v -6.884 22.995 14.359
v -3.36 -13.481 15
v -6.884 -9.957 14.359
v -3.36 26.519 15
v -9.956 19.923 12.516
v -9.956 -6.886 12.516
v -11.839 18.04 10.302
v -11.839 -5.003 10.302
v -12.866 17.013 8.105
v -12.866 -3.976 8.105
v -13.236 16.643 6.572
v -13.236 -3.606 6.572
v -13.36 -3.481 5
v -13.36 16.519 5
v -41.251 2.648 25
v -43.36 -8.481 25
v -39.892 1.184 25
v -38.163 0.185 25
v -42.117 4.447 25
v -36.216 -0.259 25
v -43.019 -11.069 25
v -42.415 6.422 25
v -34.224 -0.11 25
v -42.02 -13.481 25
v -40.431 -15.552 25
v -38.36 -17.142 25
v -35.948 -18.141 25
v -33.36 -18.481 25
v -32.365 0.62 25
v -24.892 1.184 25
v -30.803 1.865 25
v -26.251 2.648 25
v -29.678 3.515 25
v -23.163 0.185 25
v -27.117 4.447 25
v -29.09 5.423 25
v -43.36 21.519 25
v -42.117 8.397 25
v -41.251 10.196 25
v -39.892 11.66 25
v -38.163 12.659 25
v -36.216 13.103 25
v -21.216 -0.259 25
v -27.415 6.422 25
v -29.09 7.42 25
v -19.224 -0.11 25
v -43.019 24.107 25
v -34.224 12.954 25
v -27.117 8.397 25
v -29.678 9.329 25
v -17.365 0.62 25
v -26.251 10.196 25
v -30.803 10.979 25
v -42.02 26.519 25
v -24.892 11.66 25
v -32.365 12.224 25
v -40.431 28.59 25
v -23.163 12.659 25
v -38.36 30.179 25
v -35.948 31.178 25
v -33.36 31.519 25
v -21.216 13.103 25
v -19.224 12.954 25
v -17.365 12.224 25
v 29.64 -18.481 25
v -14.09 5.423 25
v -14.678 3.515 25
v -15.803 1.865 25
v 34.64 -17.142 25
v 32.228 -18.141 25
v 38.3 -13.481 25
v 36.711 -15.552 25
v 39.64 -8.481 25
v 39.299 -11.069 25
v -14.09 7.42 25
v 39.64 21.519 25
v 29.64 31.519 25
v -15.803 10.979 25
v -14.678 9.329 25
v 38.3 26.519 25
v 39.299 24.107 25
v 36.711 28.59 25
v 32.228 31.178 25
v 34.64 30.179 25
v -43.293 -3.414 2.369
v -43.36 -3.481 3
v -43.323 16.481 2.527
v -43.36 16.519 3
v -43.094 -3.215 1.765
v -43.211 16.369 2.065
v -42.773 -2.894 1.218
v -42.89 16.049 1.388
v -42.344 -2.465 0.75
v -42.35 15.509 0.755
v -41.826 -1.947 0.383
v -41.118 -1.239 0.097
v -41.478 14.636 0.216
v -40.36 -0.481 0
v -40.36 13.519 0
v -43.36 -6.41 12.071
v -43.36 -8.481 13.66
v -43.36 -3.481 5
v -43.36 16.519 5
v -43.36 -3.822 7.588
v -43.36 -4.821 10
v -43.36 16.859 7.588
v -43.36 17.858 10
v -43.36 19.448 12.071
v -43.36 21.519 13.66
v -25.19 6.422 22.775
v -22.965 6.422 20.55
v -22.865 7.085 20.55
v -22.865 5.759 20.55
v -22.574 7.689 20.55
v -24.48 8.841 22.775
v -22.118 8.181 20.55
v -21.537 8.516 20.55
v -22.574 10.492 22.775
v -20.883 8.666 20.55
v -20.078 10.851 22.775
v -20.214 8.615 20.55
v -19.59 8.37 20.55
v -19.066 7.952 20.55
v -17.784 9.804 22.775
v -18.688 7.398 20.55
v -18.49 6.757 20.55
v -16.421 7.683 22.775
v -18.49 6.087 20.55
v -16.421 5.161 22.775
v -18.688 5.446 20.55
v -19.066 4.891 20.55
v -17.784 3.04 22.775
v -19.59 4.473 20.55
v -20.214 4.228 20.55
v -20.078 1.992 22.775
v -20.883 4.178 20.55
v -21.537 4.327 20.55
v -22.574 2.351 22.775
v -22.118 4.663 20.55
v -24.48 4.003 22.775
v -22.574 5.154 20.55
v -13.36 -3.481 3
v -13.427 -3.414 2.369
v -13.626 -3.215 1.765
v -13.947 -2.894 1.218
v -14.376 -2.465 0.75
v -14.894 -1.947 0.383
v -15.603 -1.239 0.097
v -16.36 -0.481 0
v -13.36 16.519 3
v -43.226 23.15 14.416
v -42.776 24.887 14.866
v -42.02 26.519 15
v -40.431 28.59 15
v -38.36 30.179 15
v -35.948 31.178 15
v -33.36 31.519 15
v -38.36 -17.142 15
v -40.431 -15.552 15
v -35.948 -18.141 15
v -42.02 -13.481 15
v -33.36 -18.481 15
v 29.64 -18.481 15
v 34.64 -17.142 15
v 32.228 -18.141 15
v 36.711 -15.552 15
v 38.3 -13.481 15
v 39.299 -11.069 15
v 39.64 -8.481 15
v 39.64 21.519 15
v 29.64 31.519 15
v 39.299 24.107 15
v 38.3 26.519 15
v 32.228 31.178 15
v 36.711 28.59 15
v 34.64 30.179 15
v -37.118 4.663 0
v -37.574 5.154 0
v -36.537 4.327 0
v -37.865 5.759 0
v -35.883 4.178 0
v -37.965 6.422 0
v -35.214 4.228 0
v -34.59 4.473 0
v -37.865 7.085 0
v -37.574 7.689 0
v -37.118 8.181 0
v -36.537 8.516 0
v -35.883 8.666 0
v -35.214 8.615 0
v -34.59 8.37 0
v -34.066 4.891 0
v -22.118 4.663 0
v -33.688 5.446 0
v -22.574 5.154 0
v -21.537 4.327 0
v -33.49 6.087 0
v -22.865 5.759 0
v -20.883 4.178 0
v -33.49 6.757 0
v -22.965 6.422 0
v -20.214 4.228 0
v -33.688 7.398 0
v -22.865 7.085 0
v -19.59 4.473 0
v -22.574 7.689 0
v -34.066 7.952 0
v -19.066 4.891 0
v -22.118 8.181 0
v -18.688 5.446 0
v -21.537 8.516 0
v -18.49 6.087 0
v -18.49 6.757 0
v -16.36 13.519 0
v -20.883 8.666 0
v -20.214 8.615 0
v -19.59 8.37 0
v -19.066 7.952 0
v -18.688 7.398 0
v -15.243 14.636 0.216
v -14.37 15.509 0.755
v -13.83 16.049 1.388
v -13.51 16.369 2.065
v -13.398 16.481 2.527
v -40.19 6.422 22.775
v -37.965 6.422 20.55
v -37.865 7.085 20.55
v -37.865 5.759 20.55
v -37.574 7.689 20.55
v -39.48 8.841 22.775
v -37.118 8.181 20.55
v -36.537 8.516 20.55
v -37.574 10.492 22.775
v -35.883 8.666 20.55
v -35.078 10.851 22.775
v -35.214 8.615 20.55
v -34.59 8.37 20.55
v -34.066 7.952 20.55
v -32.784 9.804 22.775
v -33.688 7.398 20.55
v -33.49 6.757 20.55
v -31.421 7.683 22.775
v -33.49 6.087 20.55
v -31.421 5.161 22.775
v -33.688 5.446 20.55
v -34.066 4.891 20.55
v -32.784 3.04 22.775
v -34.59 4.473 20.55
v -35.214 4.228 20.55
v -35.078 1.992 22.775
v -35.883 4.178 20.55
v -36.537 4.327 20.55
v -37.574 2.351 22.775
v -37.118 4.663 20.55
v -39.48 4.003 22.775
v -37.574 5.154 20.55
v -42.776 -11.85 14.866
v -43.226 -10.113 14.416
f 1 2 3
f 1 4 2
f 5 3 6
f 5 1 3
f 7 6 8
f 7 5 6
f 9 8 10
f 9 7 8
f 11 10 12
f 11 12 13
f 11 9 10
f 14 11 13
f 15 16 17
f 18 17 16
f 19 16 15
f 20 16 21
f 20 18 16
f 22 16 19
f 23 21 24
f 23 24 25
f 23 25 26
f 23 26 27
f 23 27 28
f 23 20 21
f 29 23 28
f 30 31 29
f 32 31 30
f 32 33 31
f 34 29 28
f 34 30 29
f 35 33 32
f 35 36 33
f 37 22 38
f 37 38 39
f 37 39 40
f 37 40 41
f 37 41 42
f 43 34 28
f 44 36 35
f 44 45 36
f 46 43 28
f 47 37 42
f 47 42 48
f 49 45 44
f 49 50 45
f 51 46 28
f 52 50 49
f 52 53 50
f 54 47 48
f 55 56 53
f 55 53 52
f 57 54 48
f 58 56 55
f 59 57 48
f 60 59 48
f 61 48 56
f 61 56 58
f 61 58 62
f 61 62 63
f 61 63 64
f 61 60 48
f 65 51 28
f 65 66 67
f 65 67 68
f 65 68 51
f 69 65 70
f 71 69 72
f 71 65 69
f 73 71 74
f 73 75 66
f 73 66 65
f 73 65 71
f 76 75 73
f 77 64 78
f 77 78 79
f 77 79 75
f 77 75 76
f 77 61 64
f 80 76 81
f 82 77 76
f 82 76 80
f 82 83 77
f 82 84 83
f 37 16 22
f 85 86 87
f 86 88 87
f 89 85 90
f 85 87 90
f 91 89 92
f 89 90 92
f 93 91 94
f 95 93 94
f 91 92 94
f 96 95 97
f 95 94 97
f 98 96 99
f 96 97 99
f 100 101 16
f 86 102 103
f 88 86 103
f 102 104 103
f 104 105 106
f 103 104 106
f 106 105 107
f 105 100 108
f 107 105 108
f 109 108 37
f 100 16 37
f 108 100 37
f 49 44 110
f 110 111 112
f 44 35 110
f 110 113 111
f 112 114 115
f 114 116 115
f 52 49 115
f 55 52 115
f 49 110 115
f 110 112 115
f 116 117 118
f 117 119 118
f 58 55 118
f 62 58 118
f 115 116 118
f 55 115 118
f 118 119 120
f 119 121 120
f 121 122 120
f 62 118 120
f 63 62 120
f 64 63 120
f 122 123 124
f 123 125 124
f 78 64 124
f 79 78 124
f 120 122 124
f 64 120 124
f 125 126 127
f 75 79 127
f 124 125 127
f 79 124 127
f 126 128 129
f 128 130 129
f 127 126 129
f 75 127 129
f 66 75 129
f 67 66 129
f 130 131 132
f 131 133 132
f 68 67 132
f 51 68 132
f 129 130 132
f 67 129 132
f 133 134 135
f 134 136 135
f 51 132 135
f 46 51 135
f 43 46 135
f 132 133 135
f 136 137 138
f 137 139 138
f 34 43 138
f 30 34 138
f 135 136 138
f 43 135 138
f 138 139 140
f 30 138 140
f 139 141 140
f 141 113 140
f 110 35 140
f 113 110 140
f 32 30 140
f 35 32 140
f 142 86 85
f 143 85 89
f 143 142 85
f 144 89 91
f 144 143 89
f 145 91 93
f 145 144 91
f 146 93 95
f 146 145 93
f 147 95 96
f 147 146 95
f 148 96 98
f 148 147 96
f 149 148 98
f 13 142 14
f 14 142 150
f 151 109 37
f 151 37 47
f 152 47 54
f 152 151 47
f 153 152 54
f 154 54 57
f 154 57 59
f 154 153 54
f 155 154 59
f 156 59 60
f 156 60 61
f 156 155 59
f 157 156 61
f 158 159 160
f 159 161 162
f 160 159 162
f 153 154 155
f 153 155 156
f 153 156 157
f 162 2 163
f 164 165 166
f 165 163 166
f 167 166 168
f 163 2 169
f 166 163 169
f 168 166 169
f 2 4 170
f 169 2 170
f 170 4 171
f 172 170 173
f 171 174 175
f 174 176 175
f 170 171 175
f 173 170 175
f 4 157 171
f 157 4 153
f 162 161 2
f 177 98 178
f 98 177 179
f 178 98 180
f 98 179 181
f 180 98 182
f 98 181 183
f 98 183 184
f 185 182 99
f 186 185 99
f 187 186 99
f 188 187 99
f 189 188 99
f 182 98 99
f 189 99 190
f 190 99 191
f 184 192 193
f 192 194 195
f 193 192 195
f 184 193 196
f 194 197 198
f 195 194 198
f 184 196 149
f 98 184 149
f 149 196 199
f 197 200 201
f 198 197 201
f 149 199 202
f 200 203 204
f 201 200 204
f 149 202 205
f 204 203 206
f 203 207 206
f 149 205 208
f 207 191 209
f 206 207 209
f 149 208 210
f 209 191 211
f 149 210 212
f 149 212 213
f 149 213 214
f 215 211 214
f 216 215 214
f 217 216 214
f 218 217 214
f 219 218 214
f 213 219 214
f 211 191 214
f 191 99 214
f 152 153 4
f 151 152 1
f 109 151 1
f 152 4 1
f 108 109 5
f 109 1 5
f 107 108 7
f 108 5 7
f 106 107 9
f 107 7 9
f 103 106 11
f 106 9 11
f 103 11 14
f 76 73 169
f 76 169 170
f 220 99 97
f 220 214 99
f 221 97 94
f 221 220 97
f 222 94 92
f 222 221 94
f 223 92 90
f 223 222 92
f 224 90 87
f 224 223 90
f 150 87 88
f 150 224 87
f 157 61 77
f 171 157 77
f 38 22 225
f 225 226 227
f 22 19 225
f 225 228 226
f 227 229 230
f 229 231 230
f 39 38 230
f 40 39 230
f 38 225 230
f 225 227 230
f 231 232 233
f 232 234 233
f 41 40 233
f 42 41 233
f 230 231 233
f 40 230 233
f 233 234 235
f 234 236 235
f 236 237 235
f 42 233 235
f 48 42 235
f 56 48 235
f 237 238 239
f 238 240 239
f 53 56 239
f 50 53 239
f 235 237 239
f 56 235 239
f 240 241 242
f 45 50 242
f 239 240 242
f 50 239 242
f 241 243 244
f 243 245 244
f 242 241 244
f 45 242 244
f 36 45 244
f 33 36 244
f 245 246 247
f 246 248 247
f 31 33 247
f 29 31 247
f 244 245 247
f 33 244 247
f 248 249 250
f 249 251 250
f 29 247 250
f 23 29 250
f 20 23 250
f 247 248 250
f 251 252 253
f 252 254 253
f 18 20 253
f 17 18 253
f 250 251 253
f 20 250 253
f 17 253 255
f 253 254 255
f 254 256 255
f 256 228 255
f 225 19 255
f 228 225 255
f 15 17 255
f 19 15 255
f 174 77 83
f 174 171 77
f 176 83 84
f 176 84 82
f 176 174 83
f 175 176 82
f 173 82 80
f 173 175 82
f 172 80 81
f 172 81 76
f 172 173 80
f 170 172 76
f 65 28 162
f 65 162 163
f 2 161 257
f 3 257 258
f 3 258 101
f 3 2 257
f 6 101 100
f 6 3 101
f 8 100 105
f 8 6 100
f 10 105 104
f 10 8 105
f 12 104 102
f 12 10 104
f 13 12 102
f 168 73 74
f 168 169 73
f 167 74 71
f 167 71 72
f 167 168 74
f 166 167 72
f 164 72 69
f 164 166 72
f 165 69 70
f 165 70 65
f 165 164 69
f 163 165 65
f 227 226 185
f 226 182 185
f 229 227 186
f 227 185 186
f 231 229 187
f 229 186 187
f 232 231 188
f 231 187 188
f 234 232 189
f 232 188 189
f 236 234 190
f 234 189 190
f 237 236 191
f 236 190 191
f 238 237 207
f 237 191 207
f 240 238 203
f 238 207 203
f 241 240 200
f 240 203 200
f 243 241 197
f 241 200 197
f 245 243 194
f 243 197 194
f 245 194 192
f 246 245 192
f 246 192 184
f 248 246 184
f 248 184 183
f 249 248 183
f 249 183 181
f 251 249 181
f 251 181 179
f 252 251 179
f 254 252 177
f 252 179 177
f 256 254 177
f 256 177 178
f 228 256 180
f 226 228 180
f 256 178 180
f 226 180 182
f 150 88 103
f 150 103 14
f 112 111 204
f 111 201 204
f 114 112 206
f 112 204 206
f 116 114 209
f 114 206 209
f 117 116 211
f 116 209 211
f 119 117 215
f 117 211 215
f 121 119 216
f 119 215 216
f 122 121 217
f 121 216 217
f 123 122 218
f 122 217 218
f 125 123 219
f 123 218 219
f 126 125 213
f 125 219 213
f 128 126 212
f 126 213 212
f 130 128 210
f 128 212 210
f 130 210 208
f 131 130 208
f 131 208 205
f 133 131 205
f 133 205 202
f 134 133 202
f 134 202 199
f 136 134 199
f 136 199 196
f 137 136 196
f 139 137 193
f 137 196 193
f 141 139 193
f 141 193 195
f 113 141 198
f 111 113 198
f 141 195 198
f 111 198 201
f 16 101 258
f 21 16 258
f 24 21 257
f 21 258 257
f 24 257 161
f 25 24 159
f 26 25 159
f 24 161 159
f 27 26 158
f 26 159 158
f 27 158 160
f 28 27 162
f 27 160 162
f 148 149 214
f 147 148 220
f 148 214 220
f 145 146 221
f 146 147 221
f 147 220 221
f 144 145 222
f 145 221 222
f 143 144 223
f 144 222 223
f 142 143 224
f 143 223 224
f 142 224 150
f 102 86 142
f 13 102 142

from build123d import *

# Parameters (mm, degrees)
SKETCH2_W                                       = 30
SKETCH2_H                                       = 20
BOSS_EXTRUDE1_DEPTH                             = 25
SKETCH3_W                                       = 83
SKETCH3_H                                       = 50
BOSS_EXTRUDE2_DEPTH                             = 10
CSK_FOR_M4_FLAT_HEAD_MACHINE_SCREW1_D           = 4.5
CSK_FOR_M4_FLAT_HEAD_MACHINE_SCREW1_CSINK_D     = 13.4
CSK_FOR_M4_FLAT_HEAD_MACHINE_SCREW1_CSINK_ANGLE = 90
FILLET1_R                                       = 10
FILLET2_R                                       = 10
FILLET3_R                                       = 3


with BuildPart() as part:
    # Sketch2 → Boss-Extrude1 (new body)
    with BuildSketch(Plane.XY):
        with Locations((-28.360190379, 6.518738069)):
            Rectangle(SKETCH2_W, SKETCH2_H)
    extrude(amount=BOSS_EXTRUDE1_DEPTH)

    # Sketch3 → Boss-Extrude2 (add)
    with BuildSketch(Plane.XY.offset(25)):
        with Locations((-1.860190379, 6.518738069)):
            Rectangle(SKETCH3_W, SKETCH3_H)
    extrude(amount=-BOSS_EXTRUDE2_DEPTH)

    # CSK for M4 Flat Head Machine Screw1 (through all)
    with Locations(Plane.XY.offset(25)):
        with Locations((-35.714941389, 6.421876295), (-20.714941389, 6.421876295)):
            CounterSinkHole(CSK_FOR_M4_FLAT_HEAD_MACHINE_SCREW1_D / 2, CSK_FOR_M4_FLAT_HEAD_MACHINE_SCREW1_CSINK_D / 2, counter_sink_angle=CSK_FOR_M4_FLAT_HEAD_MACHINE_SCREW1_CSINK_ANGLE)

    # Fillet1
    fillet1_edges = [part.edges().sort_by_distance(p)[0] for p in [
        (-43.360190379, -18.481261931, 20),
        (-43.360190379, 31.518738069, 20),
        (39.639809621, 31.518738069, 20),
        (39.639809621, -18.481261931, 20),
    ]]
    fillet(fillet1_edges, radius=FILLET1_R)

    # Fillet2
    fillet2_edges = [part.edges().sort_by_distance(p)[0] for p in [
        (-28.360190379, -3.481261931, 15),
        (-13.360190379, 6.518738069, 15),
        (-28.360190379, 16.518738069, 15),
    ]]
    fillet(fillet2_edges, radius=FILLET2_R)

    # Fillet3
    fillet3_edges = [part.edges().sort_by_distance(p)[0] for p in [
        (-28.360190379, -3.481261931, 0),
        (-13.360190379, 6.518738069, 0),
        (-28.360190379, 16.518738069, 0),
        (-43.360190379, 6.518738069, 0),
    ]]
    fillet(fillet3_edges, radius=FILLET3_R)


solid = part.part
